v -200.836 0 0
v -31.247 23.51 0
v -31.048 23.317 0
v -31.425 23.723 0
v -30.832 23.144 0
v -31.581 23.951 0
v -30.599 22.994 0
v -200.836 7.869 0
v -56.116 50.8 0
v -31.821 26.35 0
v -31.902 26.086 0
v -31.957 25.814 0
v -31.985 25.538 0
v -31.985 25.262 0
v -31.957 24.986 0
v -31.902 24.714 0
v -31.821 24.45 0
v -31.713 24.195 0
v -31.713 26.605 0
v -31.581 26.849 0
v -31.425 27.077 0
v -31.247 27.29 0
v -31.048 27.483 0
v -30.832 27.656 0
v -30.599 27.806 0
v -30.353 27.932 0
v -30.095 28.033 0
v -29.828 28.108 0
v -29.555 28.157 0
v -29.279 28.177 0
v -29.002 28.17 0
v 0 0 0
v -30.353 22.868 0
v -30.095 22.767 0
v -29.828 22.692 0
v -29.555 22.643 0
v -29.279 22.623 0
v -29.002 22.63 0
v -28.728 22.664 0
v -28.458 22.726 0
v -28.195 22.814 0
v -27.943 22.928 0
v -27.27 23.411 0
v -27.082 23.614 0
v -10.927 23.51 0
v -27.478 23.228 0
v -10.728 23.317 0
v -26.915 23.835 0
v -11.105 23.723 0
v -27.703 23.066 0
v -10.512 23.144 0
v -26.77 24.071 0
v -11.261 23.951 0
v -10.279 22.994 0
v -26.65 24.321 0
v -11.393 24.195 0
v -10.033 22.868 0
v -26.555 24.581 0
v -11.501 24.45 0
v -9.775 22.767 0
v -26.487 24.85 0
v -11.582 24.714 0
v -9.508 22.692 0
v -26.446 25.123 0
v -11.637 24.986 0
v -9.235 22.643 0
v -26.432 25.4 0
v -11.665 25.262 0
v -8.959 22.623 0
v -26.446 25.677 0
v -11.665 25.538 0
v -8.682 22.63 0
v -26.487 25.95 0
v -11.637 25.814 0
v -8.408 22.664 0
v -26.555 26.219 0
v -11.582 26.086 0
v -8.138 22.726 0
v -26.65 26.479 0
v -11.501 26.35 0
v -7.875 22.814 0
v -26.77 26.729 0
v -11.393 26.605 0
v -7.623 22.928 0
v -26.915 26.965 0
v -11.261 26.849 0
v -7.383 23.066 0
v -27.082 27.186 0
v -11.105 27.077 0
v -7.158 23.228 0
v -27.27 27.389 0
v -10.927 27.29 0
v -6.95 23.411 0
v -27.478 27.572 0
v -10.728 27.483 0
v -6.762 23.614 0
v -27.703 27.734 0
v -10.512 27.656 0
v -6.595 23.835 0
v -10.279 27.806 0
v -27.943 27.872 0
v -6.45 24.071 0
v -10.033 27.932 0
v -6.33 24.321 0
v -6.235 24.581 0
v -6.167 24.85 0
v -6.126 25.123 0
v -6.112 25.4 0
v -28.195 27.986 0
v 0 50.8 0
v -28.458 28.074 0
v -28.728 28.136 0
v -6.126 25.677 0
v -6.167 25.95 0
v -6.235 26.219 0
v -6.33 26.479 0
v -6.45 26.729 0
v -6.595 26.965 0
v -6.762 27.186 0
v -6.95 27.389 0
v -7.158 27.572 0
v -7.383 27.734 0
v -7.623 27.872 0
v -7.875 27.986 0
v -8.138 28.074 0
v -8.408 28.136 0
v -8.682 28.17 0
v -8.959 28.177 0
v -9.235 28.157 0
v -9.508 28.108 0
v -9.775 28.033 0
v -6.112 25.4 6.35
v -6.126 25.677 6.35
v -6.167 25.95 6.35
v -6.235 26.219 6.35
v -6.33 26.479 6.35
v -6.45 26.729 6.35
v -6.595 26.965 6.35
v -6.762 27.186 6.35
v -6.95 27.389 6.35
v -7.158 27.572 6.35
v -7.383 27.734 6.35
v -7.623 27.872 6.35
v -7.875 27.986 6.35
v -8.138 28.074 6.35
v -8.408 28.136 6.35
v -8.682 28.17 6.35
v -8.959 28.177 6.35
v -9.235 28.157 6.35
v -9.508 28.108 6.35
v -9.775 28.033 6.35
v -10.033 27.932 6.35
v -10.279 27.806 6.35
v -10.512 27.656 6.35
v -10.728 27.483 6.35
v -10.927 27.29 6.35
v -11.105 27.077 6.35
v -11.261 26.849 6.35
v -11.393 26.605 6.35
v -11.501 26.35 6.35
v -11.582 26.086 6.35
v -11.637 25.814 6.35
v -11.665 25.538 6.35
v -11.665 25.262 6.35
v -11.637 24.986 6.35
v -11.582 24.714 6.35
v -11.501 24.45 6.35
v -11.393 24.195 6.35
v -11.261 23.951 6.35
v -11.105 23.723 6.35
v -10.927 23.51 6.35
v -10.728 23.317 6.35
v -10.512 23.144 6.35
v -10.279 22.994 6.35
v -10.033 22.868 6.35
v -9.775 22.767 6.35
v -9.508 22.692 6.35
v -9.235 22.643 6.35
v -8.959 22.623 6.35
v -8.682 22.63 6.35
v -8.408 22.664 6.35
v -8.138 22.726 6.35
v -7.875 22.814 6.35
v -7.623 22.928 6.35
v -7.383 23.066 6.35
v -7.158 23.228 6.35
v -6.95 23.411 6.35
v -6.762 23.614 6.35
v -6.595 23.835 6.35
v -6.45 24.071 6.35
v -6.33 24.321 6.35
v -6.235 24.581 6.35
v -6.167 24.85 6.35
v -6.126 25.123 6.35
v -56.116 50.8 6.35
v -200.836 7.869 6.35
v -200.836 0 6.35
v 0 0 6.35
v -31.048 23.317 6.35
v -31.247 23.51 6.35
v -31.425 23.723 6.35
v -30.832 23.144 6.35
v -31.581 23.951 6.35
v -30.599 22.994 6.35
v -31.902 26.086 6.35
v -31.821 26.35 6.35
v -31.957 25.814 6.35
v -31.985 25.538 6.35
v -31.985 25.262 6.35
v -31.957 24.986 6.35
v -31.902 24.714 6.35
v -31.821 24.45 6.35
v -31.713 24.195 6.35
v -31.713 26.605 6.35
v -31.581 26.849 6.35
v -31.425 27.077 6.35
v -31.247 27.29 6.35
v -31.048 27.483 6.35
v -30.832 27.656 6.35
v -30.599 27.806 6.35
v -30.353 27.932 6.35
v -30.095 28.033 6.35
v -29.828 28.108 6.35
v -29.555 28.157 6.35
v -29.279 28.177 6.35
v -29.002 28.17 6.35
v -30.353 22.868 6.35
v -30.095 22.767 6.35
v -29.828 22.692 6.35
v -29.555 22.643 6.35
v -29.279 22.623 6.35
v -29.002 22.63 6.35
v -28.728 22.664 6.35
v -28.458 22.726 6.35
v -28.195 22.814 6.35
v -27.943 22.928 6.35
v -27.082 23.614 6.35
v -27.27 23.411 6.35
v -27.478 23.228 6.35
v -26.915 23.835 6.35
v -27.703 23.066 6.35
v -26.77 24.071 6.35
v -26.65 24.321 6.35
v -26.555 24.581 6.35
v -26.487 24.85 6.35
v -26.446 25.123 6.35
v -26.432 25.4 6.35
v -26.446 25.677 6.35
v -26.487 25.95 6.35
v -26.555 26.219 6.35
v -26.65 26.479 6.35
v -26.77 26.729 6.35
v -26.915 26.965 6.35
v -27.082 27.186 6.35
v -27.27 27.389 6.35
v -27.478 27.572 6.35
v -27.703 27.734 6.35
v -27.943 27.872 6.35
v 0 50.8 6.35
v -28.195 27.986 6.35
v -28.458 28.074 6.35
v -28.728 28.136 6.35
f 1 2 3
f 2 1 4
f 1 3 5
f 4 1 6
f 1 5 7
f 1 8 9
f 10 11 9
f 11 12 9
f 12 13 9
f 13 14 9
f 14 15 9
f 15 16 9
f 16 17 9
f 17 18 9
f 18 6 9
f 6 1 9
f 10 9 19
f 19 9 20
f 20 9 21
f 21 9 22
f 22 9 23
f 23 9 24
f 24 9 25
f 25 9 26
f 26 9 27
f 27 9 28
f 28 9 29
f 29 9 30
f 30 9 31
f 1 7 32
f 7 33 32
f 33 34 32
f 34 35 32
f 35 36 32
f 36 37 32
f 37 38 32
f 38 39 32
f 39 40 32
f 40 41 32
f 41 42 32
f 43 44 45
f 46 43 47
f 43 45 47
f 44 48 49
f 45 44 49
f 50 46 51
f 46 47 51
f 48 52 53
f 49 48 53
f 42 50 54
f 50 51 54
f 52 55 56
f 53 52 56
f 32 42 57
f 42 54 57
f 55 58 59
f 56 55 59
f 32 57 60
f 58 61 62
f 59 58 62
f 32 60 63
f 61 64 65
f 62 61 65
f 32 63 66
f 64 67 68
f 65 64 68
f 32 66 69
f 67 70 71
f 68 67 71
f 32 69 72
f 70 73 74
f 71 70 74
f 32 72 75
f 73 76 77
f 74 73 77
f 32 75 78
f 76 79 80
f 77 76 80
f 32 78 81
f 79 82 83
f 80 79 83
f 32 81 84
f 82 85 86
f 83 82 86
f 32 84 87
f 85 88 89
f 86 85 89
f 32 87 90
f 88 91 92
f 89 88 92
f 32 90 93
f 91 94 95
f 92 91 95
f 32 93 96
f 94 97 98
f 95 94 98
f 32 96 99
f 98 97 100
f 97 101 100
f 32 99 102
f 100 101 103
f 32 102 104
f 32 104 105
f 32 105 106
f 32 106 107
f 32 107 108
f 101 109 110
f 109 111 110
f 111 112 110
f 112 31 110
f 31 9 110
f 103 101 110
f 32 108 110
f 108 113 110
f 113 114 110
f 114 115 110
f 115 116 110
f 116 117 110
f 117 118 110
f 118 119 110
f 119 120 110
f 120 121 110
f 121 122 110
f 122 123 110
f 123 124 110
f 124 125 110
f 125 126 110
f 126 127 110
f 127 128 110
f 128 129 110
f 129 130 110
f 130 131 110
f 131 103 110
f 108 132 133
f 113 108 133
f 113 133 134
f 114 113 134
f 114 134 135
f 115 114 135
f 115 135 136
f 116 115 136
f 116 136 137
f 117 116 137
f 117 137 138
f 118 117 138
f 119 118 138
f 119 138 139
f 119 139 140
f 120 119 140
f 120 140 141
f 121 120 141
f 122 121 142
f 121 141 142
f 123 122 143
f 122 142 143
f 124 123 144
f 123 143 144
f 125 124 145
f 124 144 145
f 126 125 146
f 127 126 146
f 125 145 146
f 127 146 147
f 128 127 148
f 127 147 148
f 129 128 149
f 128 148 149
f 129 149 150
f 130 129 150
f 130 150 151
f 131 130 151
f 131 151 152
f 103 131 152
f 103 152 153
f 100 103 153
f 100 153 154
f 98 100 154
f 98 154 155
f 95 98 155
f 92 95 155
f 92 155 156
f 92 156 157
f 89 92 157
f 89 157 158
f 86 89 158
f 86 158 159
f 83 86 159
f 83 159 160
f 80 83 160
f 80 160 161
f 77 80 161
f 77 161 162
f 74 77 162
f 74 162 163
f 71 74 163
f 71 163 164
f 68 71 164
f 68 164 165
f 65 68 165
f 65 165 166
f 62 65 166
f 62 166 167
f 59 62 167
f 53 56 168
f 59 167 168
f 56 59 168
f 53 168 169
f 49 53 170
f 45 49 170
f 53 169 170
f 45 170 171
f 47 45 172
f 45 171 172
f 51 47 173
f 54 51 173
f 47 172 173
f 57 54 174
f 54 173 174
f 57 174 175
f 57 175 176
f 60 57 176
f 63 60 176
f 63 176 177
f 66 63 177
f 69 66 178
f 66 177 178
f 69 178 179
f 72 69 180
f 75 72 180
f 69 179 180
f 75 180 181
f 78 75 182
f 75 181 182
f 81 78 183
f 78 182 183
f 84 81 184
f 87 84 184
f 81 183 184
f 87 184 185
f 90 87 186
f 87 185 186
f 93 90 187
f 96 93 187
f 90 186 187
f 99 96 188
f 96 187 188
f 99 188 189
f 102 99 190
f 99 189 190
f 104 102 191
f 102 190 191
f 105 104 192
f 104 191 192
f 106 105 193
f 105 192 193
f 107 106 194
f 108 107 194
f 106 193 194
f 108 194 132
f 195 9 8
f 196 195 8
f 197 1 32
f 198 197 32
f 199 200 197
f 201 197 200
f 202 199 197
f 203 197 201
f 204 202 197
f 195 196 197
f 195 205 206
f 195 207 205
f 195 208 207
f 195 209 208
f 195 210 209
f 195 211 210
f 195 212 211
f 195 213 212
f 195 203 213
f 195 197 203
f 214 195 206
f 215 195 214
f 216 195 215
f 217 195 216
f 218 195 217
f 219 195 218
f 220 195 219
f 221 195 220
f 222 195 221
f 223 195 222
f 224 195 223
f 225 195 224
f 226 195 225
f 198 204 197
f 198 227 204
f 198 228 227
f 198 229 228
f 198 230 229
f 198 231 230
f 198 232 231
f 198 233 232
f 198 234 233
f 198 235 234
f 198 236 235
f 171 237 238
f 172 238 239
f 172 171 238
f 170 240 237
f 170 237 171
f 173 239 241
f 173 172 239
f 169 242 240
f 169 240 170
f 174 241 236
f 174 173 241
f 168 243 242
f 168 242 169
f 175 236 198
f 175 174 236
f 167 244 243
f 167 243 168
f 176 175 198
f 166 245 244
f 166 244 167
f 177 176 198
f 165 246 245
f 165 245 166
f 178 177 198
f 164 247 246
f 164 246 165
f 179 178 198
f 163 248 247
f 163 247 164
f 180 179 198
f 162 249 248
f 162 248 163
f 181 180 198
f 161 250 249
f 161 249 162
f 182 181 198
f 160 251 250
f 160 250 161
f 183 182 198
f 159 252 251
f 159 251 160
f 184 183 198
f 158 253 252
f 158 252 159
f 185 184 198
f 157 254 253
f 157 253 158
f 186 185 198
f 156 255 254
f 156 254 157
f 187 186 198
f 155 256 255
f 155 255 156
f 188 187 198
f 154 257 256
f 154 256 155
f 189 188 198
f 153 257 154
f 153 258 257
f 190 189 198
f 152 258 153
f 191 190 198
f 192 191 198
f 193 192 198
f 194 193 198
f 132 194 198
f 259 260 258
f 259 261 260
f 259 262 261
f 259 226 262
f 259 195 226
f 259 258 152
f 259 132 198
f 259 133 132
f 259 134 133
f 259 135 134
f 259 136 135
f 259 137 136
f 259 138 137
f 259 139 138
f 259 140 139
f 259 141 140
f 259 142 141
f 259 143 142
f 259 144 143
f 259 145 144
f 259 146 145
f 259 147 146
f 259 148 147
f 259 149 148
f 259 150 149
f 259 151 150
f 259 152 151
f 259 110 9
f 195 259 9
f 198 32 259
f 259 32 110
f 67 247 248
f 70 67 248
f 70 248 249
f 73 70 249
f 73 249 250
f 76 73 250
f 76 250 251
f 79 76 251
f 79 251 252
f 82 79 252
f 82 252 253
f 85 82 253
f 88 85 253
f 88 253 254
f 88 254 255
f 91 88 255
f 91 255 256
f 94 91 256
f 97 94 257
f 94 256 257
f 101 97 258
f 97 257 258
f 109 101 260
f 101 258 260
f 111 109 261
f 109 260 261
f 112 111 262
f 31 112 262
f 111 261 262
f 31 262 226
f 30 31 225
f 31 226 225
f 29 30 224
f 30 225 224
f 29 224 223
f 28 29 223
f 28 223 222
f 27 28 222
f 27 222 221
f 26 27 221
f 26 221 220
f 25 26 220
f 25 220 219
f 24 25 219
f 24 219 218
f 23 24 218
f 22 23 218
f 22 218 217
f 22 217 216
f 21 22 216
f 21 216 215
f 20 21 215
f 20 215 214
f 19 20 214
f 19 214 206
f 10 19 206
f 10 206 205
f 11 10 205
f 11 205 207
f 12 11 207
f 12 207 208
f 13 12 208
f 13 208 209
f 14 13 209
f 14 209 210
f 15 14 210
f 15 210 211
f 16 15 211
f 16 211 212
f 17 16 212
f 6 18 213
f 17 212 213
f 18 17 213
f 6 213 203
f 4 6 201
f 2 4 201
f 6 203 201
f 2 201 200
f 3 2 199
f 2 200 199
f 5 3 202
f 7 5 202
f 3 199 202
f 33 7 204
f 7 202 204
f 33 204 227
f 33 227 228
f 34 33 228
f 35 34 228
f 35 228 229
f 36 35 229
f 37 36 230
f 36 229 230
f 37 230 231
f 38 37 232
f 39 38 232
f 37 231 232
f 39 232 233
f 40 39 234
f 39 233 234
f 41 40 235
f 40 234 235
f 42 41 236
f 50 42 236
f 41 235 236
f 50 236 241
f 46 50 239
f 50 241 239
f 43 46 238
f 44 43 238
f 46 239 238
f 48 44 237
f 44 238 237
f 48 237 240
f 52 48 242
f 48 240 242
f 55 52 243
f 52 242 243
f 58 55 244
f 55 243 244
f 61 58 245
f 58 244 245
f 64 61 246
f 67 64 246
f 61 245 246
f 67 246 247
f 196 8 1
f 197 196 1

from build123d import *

# Parameters (mm, degrees)
BOSS_EXTRUDE1_DEPTH = 6.35
SKETCH2_R           = 2.778125
CUT_EXTRUDE1_DEPTH  = 208.258653961


with BuildPart() as part:
    # Sketch1 → Boss-Extrude1 (new body)
    with BuildSketch(Plane.XY):
        Polygon((0, 0), (0, 50.8), (-56.115509559, 50.8), (-200.836219696, 7.8694881), (-200.836219696, 0), align=None)
    extrude(amount=BOSS_EXTRUDE1_DEPTH)

    # Sketch2 → Cut-Extrude1 (cut, through all)
    with BuildSketch(Plane.XY.offset(6.35)):
        with Locations((-29.21, 25.4)):
            Circle(SKETCH2_R)
        with Locations((-8.89, 25.4)):
            Circle(SKETCH2_R)
    extrude(amount=-CUT_EXTRUDE1_DEPTH, mode=Mode.SUBTRACT)


solid = part.part
